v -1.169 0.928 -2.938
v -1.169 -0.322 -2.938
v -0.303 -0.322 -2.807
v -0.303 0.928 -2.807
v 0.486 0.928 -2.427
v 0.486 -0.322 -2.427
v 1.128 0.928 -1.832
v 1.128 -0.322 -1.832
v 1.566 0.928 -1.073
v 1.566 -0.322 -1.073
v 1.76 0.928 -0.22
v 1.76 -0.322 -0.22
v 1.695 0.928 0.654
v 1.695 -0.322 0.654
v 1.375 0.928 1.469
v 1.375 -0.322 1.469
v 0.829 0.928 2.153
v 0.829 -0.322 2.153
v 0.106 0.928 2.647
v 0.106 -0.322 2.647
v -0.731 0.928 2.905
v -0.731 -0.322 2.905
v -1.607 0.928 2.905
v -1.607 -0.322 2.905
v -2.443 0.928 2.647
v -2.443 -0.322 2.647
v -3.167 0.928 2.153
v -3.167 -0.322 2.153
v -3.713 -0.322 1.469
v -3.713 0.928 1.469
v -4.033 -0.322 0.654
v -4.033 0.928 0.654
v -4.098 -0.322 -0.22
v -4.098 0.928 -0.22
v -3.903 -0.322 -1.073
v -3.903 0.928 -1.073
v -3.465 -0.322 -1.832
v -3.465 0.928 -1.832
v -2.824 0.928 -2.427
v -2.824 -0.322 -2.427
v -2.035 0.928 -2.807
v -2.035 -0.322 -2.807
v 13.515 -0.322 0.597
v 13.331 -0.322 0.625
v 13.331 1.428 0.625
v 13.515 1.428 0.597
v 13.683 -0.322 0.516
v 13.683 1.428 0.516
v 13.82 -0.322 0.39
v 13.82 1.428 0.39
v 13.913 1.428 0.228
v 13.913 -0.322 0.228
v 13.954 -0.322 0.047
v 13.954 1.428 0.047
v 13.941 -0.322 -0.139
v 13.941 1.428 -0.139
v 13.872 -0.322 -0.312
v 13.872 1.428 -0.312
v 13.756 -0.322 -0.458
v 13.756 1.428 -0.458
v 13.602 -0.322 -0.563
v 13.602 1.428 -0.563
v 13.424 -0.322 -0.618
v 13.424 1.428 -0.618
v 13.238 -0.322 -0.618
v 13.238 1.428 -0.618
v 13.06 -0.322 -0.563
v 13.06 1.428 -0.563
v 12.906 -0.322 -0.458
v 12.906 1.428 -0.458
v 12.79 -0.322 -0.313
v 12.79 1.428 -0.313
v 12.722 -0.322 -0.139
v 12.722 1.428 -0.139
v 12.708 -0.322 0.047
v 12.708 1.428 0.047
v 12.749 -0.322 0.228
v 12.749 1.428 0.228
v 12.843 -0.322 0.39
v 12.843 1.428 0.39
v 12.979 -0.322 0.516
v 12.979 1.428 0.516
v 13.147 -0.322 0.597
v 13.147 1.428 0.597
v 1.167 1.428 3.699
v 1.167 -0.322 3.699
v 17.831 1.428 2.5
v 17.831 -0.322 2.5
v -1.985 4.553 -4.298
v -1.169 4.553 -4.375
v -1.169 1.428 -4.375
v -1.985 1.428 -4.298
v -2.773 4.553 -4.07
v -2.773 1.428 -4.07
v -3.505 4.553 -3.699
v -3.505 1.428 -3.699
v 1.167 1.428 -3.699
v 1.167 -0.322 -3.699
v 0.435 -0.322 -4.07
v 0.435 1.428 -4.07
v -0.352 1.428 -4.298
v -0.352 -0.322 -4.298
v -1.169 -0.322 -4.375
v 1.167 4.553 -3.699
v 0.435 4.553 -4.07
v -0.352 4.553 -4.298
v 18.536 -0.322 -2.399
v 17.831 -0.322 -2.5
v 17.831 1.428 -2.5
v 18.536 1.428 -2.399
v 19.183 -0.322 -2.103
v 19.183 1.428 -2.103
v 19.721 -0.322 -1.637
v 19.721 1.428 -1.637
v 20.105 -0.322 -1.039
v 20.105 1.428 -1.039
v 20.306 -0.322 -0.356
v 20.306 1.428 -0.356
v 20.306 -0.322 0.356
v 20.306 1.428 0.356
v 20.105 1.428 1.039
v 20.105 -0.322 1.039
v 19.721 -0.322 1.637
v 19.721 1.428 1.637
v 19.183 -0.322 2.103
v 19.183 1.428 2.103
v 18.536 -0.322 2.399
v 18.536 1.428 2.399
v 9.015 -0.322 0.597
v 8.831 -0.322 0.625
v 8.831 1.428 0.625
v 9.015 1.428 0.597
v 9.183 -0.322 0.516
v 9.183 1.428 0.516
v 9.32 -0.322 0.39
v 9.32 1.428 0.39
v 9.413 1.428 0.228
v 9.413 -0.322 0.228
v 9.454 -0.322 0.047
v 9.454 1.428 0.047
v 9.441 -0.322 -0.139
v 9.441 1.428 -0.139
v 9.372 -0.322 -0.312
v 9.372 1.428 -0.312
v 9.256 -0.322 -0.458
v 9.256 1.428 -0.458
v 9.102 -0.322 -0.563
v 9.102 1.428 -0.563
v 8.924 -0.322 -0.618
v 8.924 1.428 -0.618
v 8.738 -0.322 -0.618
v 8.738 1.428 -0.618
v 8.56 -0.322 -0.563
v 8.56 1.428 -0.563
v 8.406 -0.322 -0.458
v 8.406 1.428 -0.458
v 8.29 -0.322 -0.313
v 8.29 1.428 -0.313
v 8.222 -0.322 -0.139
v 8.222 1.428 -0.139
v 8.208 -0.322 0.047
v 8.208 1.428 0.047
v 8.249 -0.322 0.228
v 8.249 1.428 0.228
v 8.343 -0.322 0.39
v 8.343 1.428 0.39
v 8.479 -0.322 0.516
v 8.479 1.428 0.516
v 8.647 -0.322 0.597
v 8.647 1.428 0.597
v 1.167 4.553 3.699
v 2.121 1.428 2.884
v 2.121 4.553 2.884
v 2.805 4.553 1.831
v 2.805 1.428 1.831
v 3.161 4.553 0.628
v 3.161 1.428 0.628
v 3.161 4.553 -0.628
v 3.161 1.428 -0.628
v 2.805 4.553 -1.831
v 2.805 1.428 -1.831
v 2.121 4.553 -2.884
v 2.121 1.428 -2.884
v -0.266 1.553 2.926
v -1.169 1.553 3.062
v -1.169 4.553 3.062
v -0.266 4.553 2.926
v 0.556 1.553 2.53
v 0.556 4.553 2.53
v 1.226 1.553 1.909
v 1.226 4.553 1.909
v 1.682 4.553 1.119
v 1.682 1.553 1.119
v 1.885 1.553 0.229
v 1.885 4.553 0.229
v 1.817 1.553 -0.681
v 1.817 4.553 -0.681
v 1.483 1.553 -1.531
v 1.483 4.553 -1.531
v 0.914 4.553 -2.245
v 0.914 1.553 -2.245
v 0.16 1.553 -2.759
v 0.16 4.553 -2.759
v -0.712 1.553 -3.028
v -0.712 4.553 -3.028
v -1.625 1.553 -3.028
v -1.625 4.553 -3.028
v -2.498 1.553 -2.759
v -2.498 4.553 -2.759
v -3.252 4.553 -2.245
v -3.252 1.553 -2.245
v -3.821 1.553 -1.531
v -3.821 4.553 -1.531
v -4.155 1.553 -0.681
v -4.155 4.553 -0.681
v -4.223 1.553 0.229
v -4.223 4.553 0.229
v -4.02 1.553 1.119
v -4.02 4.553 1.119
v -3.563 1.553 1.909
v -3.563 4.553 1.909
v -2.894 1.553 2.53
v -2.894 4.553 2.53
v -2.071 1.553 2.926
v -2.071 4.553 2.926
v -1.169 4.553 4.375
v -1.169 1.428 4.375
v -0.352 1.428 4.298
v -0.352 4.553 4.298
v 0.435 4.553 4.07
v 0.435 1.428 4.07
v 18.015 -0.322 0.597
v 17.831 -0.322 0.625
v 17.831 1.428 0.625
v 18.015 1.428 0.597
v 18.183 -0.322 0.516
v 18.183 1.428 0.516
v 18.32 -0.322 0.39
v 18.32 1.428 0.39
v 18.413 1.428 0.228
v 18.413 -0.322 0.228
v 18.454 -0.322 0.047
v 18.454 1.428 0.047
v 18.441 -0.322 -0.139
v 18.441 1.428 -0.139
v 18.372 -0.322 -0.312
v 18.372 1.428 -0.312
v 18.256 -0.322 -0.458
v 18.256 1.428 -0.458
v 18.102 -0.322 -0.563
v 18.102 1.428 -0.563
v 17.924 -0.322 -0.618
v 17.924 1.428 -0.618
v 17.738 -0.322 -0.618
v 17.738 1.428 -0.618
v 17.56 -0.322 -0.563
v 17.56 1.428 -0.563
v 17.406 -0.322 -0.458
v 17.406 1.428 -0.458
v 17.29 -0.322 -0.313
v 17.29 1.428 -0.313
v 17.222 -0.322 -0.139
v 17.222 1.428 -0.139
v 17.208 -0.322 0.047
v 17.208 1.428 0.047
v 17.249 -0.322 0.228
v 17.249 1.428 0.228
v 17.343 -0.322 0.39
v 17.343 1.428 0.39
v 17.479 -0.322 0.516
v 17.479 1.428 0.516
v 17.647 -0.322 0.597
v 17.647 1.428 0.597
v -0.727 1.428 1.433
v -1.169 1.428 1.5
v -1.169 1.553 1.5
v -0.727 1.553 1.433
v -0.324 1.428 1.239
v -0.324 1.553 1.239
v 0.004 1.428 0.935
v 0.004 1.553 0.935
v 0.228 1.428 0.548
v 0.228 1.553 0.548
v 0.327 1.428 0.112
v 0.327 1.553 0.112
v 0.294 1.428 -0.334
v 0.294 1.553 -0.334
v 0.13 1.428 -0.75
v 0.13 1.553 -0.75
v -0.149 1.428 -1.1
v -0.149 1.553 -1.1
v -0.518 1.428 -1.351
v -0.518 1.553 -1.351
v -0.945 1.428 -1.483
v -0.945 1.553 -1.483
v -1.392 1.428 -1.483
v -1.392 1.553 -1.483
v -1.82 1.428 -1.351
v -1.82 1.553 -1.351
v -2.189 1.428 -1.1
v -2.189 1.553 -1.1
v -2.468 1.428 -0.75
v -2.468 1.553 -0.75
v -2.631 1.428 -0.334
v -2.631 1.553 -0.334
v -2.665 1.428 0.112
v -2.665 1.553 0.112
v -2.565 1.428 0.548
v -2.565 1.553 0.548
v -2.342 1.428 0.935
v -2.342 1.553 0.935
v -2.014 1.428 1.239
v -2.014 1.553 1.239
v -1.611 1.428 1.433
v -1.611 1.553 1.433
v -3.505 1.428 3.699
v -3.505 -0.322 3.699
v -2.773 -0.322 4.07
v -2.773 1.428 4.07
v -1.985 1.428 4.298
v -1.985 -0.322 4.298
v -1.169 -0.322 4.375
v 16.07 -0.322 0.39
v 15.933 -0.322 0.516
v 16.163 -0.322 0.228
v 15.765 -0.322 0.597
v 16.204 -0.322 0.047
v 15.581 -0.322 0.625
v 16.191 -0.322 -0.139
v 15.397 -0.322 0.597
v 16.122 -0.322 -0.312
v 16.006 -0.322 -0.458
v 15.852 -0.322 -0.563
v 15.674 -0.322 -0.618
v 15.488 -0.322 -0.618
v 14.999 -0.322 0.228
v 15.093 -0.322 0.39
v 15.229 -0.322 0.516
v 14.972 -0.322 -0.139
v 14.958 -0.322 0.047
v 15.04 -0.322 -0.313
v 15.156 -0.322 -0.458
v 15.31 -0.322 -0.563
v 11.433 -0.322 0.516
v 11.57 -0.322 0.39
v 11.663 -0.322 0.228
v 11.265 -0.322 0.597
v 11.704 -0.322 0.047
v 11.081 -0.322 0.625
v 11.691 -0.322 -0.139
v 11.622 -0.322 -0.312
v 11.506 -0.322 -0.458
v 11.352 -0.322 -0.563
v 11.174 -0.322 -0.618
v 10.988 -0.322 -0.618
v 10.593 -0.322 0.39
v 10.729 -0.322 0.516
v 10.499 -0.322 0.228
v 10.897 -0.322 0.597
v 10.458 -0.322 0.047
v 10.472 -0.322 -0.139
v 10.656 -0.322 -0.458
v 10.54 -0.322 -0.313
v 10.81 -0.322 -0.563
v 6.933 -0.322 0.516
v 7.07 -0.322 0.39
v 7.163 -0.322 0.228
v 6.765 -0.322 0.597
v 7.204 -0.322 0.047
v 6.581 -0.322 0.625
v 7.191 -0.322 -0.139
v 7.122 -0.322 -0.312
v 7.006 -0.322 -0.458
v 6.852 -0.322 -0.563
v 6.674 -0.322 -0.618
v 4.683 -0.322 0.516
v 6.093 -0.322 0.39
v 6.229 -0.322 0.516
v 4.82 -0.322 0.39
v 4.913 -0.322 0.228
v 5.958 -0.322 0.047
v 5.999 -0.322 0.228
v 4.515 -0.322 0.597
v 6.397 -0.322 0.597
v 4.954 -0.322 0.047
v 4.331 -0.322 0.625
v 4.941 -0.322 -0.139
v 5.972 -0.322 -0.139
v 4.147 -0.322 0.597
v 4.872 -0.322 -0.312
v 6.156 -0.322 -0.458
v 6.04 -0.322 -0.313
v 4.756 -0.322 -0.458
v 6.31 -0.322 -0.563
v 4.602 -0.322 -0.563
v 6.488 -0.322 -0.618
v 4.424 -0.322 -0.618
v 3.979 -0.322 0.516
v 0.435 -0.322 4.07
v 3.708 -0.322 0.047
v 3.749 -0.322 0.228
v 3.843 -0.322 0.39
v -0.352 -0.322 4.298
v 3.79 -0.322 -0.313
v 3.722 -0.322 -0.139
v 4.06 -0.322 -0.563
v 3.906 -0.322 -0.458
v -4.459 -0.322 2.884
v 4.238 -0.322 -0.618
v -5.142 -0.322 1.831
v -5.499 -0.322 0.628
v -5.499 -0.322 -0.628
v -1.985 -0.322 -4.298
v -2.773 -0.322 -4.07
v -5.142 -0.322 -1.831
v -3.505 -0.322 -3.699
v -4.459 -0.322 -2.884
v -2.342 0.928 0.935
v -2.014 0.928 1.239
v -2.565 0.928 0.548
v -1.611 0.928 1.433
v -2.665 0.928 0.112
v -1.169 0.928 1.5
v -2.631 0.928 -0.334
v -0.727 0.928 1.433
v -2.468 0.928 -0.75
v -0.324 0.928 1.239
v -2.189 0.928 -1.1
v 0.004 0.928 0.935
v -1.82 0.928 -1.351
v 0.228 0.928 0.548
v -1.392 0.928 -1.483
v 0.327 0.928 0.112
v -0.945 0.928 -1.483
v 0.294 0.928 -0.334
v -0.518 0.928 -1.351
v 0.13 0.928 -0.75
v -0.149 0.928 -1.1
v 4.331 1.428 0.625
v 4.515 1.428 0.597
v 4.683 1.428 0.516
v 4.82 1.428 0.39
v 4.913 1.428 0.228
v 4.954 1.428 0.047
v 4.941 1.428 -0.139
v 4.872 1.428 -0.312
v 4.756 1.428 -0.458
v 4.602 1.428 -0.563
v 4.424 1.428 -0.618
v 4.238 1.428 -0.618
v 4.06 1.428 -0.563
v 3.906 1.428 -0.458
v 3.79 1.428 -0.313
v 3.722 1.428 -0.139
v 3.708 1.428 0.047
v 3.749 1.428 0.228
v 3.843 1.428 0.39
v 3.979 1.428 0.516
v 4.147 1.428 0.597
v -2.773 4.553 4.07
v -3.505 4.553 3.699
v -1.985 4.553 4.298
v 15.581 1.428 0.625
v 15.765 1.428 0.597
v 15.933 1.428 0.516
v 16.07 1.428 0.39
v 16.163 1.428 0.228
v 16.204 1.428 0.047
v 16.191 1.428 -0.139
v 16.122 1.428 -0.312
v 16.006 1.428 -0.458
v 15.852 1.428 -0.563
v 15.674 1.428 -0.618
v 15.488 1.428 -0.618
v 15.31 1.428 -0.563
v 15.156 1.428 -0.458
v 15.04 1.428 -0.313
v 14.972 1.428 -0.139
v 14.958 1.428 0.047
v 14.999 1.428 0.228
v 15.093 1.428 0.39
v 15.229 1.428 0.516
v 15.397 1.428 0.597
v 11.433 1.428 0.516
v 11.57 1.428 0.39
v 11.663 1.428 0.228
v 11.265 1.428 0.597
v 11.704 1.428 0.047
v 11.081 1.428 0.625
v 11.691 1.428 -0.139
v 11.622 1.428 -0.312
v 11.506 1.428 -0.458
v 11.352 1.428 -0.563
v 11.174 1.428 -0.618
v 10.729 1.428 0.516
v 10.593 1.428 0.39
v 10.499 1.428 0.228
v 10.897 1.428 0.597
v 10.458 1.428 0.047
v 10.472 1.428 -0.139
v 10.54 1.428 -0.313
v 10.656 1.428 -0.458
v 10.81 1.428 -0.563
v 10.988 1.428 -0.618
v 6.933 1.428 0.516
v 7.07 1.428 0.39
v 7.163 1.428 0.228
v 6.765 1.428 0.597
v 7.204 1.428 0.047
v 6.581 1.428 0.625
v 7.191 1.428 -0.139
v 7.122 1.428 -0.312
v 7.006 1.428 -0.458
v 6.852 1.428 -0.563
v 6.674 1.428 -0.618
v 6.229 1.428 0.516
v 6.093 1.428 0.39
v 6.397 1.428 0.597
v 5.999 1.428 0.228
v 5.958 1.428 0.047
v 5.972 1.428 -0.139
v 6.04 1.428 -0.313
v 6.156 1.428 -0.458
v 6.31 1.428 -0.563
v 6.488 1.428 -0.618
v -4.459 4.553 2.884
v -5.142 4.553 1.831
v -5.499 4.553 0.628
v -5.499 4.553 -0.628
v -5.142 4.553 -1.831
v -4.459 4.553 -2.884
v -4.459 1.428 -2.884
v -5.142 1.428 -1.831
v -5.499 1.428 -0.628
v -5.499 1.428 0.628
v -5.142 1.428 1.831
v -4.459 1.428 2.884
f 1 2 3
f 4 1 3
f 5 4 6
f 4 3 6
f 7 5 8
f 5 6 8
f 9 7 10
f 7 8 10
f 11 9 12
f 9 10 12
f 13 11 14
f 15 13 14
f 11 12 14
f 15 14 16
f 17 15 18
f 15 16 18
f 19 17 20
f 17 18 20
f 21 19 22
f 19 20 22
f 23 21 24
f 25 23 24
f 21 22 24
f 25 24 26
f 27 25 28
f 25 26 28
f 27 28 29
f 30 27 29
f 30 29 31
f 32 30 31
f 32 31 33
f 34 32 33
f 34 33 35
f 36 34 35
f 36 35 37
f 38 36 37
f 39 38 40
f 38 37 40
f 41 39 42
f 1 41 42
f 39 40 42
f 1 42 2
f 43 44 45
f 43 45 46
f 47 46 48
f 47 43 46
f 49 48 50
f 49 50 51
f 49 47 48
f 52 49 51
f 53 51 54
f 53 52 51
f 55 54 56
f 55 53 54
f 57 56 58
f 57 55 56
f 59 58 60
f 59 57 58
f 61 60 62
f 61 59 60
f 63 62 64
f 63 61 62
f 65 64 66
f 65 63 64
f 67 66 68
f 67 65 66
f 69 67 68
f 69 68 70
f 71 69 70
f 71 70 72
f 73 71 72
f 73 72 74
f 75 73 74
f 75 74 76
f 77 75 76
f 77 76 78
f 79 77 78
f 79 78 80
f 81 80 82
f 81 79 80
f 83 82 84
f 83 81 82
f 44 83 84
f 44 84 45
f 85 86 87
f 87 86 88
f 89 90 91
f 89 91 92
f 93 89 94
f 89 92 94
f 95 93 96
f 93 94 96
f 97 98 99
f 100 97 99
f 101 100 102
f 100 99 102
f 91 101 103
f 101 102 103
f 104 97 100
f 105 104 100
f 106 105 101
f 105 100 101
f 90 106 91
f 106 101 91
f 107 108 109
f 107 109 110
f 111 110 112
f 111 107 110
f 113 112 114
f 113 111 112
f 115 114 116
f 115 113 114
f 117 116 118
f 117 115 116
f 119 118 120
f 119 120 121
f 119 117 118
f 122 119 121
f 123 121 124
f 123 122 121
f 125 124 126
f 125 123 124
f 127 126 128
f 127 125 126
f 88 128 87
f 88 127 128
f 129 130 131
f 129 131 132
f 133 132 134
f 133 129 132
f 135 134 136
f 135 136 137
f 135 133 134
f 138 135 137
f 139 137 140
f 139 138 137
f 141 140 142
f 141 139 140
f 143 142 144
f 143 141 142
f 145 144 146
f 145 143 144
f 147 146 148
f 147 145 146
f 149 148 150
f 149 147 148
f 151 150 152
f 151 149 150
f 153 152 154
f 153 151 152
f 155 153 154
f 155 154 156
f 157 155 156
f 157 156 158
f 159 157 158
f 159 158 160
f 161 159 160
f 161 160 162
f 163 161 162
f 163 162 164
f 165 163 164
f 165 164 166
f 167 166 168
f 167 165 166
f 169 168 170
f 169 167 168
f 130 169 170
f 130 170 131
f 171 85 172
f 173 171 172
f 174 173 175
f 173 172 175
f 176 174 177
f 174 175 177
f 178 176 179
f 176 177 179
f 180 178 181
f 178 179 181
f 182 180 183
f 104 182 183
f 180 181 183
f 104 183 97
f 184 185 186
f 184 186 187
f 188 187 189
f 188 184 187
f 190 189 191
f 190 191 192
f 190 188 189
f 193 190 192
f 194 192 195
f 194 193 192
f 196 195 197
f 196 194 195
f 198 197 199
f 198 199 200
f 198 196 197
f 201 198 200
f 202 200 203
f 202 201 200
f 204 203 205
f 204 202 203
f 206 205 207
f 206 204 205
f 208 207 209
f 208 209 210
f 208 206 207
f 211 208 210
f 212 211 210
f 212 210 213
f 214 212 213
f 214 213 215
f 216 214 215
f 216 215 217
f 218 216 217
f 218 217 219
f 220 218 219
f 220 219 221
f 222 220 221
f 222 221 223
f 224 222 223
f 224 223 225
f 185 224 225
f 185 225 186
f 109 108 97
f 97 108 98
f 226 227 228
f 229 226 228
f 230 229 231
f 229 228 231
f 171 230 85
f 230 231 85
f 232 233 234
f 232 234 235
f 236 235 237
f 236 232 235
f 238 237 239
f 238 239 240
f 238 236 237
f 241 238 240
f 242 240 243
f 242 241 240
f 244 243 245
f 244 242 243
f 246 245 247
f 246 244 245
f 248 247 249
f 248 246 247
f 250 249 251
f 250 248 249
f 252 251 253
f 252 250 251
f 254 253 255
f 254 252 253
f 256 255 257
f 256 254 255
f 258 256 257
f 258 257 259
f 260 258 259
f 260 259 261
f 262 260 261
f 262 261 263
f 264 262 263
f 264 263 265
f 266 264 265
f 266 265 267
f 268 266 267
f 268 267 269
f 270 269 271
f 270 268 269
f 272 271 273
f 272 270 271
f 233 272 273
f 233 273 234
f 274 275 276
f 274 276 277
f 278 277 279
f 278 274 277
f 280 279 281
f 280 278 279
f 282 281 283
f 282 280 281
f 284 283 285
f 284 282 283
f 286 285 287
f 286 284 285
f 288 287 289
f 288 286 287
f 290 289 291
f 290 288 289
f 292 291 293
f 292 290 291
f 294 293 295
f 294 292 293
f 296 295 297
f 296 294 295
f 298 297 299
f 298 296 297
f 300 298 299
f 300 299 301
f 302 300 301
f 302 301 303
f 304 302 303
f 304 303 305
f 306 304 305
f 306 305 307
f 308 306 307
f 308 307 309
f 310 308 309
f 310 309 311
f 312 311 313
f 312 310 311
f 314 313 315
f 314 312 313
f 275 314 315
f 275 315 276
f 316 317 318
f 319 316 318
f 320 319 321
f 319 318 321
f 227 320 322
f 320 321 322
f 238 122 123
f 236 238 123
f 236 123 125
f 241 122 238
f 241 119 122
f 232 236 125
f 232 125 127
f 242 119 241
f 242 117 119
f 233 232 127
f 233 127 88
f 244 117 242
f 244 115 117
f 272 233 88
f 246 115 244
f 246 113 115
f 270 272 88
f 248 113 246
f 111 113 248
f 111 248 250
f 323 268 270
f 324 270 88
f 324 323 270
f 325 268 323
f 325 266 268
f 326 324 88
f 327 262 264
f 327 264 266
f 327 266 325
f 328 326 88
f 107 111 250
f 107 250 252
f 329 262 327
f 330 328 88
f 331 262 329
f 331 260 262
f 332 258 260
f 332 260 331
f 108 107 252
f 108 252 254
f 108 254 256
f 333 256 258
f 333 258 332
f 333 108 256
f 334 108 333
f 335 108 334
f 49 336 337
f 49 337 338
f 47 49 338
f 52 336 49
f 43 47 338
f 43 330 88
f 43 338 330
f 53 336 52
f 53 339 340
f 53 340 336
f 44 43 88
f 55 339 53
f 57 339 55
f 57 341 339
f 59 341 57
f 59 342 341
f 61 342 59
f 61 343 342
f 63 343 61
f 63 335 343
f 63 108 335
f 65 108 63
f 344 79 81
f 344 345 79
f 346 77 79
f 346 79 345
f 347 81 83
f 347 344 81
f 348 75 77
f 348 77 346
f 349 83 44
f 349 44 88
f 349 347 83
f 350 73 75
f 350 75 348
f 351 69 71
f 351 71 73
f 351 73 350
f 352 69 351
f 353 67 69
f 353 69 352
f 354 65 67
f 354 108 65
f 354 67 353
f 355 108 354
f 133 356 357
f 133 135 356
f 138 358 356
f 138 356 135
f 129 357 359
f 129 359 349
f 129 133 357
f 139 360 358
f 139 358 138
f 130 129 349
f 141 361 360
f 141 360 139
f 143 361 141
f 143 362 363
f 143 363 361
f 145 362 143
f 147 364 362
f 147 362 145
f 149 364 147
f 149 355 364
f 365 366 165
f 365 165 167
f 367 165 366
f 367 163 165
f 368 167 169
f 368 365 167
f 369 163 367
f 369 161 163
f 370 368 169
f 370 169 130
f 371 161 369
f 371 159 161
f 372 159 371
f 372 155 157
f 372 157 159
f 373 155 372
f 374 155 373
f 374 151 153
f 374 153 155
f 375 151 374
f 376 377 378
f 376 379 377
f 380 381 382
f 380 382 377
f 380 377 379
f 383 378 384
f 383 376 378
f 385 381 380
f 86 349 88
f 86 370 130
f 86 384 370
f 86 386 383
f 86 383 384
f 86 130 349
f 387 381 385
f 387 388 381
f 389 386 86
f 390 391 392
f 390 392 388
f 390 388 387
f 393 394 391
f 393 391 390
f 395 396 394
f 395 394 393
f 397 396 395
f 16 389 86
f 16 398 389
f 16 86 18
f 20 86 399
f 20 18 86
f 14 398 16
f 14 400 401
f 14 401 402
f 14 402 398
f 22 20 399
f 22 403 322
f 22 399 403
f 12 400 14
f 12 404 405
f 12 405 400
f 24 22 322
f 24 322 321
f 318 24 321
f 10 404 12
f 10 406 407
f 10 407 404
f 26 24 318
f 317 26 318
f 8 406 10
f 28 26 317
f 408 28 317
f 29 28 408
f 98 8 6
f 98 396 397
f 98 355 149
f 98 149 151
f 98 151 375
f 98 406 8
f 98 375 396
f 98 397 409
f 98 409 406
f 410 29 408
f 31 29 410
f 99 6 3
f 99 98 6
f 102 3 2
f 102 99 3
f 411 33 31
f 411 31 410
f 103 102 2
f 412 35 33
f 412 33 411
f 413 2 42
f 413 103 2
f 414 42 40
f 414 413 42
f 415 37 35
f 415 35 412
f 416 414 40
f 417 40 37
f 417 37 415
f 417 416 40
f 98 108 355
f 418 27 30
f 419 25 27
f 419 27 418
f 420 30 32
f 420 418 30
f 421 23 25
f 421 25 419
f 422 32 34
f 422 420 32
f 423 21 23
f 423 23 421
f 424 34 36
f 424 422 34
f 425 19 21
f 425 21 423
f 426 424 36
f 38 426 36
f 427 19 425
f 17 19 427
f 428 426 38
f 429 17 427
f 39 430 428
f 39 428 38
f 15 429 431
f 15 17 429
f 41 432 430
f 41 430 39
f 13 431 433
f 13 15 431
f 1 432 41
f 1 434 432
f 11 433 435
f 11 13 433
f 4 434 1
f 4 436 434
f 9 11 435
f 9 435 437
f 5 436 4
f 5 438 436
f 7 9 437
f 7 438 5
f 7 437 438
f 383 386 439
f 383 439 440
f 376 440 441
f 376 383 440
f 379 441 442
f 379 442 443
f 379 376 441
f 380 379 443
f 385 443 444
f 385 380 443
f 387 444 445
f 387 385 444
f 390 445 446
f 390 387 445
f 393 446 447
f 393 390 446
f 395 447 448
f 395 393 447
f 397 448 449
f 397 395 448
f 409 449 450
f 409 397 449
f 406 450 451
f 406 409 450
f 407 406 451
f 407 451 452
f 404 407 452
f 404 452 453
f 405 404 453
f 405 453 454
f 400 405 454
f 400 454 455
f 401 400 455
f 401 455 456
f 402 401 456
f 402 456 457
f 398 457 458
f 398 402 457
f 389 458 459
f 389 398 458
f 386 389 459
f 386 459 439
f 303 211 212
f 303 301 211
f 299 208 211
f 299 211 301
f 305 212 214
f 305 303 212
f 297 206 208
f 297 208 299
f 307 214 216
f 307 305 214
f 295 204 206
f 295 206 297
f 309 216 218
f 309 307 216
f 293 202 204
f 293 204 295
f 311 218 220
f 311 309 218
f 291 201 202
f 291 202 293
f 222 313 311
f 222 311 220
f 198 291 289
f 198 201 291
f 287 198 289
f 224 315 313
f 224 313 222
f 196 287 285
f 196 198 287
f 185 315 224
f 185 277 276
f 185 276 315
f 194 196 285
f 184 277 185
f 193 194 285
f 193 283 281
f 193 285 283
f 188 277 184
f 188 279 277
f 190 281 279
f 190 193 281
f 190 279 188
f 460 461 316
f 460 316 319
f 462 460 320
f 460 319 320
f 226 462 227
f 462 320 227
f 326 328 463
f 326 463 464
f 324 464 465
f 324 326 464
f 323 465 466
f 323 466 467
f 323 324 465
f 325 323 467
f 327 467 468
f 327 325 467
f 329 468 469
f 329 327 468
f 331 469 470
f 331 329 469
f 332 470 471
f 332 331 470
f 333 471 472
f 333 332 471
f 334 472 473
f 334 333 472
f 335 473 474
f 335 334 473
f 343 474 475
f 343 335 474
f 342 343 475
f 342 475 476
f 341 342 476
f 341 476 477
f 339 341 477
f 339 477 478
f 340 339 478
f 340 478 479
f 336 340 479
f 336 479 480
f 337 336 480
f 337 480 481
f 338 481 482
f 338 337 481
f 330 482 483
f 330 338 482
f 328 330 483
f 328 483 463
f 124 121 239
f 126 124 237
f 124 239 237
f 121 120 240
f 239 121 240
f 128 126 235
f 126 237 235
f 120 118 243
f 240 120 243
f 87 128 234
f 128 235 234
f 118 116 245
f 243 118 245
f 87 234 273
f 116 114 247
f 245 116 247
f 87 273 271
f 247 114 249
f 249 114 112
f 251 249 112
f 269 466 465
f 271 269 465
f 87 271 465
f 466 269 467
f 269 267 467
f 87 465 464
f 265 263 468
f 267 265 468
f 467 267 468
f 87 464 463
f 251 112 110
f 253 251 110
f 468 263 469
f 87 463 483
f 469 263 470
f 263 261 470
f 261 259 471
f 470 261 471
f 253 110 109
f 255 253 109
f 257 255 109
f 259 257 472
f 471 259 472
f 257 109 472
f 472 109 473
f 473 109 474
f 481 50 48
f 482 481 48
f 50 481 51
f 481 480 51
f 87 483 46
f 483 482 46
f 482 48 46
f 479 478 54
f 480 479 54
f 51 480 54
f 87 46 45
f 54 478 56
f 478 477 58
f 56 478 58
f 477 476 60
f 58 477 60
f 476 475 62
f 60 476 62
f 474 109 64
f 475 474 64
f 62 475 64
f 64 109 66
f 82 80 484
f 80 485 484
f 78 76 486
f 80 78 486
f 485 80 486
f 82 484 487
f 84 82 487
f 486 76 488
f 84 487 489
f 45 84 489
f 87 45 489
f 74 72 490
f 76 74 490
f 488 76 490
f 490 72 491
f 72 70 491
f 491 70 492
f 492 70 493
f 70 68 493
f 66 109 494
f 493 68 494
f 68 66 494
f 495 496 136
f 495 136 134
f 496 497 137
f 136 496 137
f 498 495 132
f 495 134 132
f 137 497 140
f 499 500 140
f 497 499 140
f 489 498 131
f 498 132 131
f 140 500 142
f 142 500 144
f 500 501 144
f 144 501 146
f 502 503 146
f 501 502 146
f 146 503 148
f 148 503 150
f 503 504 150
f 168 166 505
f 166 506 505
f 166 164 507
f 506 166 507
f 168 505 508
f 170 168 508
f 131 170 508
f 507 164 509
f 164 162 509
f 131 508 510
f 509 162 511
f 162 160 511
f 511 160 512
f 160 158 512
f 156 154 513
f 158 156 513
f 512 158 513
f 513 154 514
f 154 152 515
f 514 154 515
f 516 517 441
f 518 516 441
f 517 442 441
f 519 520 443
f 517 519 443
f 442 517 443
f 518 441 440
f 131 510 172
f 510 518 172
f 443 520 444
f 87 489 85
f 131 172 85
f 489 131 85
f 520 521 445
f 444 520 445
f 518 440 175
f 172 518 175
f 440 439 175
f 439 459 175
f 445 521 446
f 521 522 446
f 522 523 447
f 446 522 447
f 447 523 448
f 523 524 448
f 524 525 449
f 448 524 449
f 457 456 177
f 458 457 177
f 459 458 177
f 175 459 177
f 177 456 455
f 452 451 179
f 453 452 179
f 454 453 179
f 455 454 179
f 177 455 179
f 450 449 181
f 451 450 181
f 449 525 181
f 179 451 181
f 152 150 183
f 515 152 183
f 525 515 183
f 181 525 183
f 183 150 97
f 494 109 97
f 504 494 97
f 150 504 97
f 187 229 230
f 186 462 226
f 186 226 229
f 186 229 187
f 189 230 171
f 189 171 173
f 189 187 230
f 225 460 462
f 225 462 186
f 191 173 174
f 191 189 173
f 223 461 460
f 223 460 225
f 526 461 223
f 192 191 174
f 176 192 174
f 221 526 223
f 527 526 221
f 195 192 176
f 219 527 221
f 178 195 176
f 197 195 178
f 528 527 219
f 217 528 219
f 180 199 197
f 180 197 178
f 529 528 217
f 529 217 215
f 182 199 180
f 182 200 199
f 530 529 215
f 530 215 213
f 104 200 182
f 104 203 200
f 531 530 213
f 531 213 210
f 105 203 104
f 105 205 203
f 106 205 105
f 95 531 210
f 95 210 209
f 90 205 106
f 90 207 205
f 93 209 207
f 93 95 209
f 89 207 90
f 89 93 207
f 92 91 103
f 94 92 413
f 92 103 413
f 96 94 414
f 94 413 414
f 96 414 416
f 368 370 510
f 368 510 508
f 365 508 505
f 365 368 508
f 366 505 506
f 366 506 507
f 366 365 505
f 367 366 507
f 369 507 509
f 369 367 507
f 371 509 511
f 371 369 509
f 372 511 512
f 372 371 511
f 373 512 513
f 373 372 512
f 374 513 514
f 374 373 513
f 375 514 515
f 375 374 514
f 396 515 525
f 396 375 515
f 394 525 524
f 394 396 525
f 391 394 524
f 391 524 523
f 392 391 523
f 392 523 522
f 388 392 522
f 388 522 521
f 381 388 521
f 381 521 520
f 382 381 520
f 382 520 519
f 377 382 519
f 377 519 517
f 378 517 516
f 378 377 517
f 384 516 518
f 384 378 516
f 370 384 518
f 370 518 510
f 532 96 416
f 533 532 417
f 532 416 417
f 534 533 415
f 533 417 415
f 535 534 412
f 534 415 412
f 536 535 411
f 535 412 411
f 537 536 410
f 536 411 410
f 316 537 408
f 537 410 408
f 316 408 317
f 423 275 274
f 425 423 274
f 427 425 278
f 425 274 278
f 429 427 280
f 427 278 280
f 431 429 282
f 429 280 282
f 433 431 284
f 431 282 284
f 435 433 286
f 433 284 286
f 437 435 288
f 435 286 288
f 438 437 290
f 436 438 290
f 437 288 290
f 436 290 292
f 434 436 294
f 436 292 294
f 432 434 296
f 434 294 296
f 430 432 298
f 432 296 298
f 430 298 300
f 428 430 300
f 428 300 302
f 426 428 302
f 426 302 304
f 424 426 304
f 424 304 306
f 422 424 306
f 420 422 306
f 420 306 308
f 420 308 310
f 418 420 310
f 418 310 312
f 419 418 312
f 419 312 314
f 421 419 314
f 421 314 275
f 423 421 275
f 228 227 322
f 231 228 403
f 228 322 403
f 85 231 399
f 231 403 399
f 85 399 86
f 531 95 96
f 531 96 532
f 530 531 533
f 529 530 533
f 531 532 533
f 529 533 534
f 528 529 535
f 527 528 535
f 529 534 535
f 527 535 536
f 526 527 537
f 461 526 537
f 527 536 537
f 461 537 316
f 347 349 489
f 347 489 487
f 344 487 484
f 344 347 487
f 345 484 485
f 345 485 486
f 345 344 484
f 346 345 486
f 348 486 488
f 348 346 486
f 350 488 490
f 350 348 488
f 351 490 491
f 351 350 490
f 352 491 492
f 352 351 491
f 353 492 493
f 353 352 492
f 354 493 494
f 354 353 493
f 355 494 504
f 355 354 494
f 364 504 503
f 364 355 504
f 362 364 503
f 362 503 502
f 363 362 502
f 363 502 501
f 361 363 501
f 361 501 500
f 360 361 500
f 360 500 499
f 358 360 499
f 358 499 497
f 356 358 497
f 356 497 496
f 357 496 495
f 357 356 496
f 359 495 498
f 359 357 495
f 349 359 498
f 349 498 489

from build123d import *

# Parameters (mm, degrees)
SKETCH1_R           = 0.5
BOSS_EXTRUDE1_DEPTH = 1.4
SKETCH2_R           = 2.35
CUT_EXTRUDE1_DEPTH  = 1
SKETCH3_R           = 3.5
SKETCH3_R_2         = 2.45
BOSS_EXTRUDE2_DEPTH = 2.5
SKETCH4_R           = 1.2
CUT_EXTRUDE2_DEPTH  = 20.282440198
SKETCH5_R           = 2.45
SKETCH5_R_2         = 1.2
BOSS_EXTRUDE3_DEPTH = 0.1
SKETCH6_W           = 35.735260114
SKETCH6_H           = 17.672039004
CUT_EXTRUDE4_DEPTH  = 20.513392837
CUT_EXTRUDE5_DEPTH  = 18.980545042
SCALE1_SCALE        = 0.5
SCALE2_SCALE        = 2.5


with BuildPart() as part:
    # Sketch1 → Boss-Extrude1 (new body)
    with BuildSketch(Plane(origin=(0, 0, 0), x_dir=(1, 0, 0), z_dir=(0, 1, 0))):
        with BuildLine():
            Line((-15.2, 2), (-2, 2.95))
            Line((-2, 2.95), (-2, 6.35))
            ThreePointArc((-2, 6.35), (0, 8.35), (2, 6.35))
            Line((2, 6.35), (2, 3.5))
            Line((2, 3.5), (15.2, 2))
            ThreePointArc((15.2, 2), (17.2, 0), (15.2, -2))
            Line((15.2, -2), (2, -3.5))
            Line((2, -3.5), (2, -6.35))
            ThreePointArc((2, -6.35), (0, -8.35), (-2, -6.35))
            Line((-2, -6.35), (-2, -2.95))
            Line((-2, -2.95), (-15.2, -2))
            ThreePointArc((-15.2, -2), (-17.2, 0), (-15.2, 2))
        make_face()
        with Locations((0, 6.35)):
            Circle(SKETCH1_R, mode=Mode.SUBTRACT)
        with Locations((0, 4.55)):
            Circle(SKETCH1_R, mode=Mode.SUBTRACT)
        with Locations((0, -4.55)):
            Circle(SKETCH1_R, mode=Mode.SUBTRACT)
        with Locations((0, -6.35)):
            Circle(SKETCH1_R, mode=Mode.SUBTRACT)
        with Locations((-15.2, 0)):
            Circle(SKETCH1_R, mode=Mode.SUBTRACT)
        with Locations(Location((15.2, 0, 0), (0, 0, 270))):
            Circle(SKETCH1_R, mode=Mode.SUBTRACT)
        with Locations((-13.4, 0)):
            Circle(SKETCH1_R, mode=Mode.SUBTRACT)
        with Locations((-11.6, 0)):
            Circle(SKETCH1_R, mode=Mode.SUBTRACT)
        with Locations((-9.8, 0)):
            Circle(SKETCH1_R, mode=Mode.SUBTRACT)
        with Locations((-8, 0)):
            Circle(SKETCH1_R, mode=Mode.SUBTRACT)
        with Locations((-6.2, 0)):
            Circle(SKETCH1_R, mode=Mode.SUBTRACT)
        with Locations((-4.4, 0)):
            Circle(SKETCH1_R, mode=Mode.SUBTRACT)
        with Locations(Location((13.4, 0, 0), (0, 0, 270))):
            Circle(SKETCH1_R, mode=Mode.SUBTRACT)
        with Locations(Location((11.6, 0, 0), (0, 0, 270))):
            Circle(SKETCH1_R, mode=Mode.SUBTRACT)
        with Locations(Location((9.8, 0, 0), (0, 0, 270))):
            Circle(SKETCH1_R, mode=Mode.SUBTRACT)
        with Locations(Location((8, 0, 0), (0, 0, 270))):
            Circle(SKETCH1_R, mode=Mode.SUBTRACT)
        with Locations(Location((6.2, 0, 0), (0, 0, 270))):
            Circle(SKETCH1_R, mode=Mode.SUBTRACT)
        with Locations(Location((4.4, 0, 0), (0, 0, 270))):
            Circle(SKETCH1_R, mode=Mode.SUBTRACT)
    extrude(amount=BOSS_EXTRUDE1_DEPTH)

    # Sketch2 → Cut-Extrude1 (cut)
    with BuildSketch(Plane.XZ):
        with Locations(Location((0, 0, 0), (0, 0, 270))):
            Circle(SKETCH2_R)
    extrude(amount=-CUT_EXTRUDE1_DEPTH, mode=Mode.SUBTRACT)

    # Sketch3 → Boss-Extrude2 (add)
    with BuildSketch(Plane(origin=(0, 1.4, 0), x_dir=(1, 0, 0), z_dir=(0, 1, 0))):
        with Locations(Location((0, 0, 0), (0, 0, 57.731921145))):
            Circle(SKETCH3_R)
        with Locations(Location((0, 0, 0), (0, 0, 270))):
            Circle(SKETCH3_R_2, mode=Mode.SUBTRACT)
    extrude(amount=BOSS_EXTRUDE2_DEPTH)

    # Sketch4 → Cut-Extrude2 (cut, through all)
    with BuildSketch(Plane(origin=(0, 1.4, 0), x_dir=(1, 0, 0), z_dir=(0, 1, 0))):
        with Locations(Location((0, 0, 0), (0, 0, 270))):
            Circle(SKETCH4_R)
    extrude(amount=-CUT_EXTRUDE2_DEPTH, mode=Mode.SUBTRACT)

    # Sketch5 → Boss-Extrude3 (add)
    with BuildSketch(Plane(origin=(0, 1.4, 0), x_dir=(1, 0, 0), z_dir=(0, 1, 0))):
        with Locations(Location((0, 0, 0), (0, 0, 270))):
            Circle(SKETCH5_R)
        with Locations(Location((0, 0, 0), (0, 0, 270))):
            Circle(SKETCH5_R_2, mode=Mode.SUBTRACT)
    extrude(amount=BOSS_EXTRUDE3_DEPTH)

    # Sketch6 → Cut-Extrude4 (cut, through all)
    with BuildSketch(Plane.XZ):
        Rectangle(SKETCH6_W, SKETCH6_H)
        with BuildLine():
            Line((-1.868584713, -2.959457918), (-15.2, -2))
            ThreePointArc((-15.2, -2), (-17.2, 0), (-15.2, 2))
            Line((-15.2, 2), (-1.868584713, 2.959457918))
            ThreePointArc((-1.868584713, 2.959457918), (0, 3.5), (1.868584713, 2.959457918))
            Line((1.868584713, 2.959457918), (15.2, 2))
            ThreePointArc((15.2, 2), (17.2, 0), (15.2, -2))
            Line((15.2, -2), (1.868584713, -2.959457918))
            ThreePointArc((1.868584713, -2.959457918), (0, -3.5), (-1.868584713, -2.959457918))
        make_face(mode=Mode.SUBTRACT)
    extrude(amount=-CUT_EXTRUDE4_DEPTH, mode=Mode.SUBTRACT)

    # Sketch7 → Cut-Extrude5 (cut, through all)
    with BuildSketch(Plane.XZ):
        with BuildLine():
            Line((0, 3.5), (-17.731768104, 3.5))
            Line((-17.731768104, 3.5), (-17.731768104, -3.5))
            Line((-17.731768104, -3.5), (0, -3.5))
            ThreePointArc((0, -3.5), (-3.5, 0), (0, 3.5))
        make_face()
    extrude(amount=-CUT_EXTRUDE5_DEPTH, mode=Mode.SUBTRACT)


with BuildPart() as part_1:
    # Scale1: scaled about (4.675225988, 1.286509447, 0)
    add(part.part.scale(SCALE1_SCALE).moved(Location((2.337612994, 0.643254724, 0))))


with BuildPart() as part_2:
    # Scale2: scaled about (4.675225988, 1.286509447, 0)
    add(part_1.part.scale(SCALE2_SCALE).moved(Location((-7.012838982, -1.92976417, 0))))


solid = part_2.part
